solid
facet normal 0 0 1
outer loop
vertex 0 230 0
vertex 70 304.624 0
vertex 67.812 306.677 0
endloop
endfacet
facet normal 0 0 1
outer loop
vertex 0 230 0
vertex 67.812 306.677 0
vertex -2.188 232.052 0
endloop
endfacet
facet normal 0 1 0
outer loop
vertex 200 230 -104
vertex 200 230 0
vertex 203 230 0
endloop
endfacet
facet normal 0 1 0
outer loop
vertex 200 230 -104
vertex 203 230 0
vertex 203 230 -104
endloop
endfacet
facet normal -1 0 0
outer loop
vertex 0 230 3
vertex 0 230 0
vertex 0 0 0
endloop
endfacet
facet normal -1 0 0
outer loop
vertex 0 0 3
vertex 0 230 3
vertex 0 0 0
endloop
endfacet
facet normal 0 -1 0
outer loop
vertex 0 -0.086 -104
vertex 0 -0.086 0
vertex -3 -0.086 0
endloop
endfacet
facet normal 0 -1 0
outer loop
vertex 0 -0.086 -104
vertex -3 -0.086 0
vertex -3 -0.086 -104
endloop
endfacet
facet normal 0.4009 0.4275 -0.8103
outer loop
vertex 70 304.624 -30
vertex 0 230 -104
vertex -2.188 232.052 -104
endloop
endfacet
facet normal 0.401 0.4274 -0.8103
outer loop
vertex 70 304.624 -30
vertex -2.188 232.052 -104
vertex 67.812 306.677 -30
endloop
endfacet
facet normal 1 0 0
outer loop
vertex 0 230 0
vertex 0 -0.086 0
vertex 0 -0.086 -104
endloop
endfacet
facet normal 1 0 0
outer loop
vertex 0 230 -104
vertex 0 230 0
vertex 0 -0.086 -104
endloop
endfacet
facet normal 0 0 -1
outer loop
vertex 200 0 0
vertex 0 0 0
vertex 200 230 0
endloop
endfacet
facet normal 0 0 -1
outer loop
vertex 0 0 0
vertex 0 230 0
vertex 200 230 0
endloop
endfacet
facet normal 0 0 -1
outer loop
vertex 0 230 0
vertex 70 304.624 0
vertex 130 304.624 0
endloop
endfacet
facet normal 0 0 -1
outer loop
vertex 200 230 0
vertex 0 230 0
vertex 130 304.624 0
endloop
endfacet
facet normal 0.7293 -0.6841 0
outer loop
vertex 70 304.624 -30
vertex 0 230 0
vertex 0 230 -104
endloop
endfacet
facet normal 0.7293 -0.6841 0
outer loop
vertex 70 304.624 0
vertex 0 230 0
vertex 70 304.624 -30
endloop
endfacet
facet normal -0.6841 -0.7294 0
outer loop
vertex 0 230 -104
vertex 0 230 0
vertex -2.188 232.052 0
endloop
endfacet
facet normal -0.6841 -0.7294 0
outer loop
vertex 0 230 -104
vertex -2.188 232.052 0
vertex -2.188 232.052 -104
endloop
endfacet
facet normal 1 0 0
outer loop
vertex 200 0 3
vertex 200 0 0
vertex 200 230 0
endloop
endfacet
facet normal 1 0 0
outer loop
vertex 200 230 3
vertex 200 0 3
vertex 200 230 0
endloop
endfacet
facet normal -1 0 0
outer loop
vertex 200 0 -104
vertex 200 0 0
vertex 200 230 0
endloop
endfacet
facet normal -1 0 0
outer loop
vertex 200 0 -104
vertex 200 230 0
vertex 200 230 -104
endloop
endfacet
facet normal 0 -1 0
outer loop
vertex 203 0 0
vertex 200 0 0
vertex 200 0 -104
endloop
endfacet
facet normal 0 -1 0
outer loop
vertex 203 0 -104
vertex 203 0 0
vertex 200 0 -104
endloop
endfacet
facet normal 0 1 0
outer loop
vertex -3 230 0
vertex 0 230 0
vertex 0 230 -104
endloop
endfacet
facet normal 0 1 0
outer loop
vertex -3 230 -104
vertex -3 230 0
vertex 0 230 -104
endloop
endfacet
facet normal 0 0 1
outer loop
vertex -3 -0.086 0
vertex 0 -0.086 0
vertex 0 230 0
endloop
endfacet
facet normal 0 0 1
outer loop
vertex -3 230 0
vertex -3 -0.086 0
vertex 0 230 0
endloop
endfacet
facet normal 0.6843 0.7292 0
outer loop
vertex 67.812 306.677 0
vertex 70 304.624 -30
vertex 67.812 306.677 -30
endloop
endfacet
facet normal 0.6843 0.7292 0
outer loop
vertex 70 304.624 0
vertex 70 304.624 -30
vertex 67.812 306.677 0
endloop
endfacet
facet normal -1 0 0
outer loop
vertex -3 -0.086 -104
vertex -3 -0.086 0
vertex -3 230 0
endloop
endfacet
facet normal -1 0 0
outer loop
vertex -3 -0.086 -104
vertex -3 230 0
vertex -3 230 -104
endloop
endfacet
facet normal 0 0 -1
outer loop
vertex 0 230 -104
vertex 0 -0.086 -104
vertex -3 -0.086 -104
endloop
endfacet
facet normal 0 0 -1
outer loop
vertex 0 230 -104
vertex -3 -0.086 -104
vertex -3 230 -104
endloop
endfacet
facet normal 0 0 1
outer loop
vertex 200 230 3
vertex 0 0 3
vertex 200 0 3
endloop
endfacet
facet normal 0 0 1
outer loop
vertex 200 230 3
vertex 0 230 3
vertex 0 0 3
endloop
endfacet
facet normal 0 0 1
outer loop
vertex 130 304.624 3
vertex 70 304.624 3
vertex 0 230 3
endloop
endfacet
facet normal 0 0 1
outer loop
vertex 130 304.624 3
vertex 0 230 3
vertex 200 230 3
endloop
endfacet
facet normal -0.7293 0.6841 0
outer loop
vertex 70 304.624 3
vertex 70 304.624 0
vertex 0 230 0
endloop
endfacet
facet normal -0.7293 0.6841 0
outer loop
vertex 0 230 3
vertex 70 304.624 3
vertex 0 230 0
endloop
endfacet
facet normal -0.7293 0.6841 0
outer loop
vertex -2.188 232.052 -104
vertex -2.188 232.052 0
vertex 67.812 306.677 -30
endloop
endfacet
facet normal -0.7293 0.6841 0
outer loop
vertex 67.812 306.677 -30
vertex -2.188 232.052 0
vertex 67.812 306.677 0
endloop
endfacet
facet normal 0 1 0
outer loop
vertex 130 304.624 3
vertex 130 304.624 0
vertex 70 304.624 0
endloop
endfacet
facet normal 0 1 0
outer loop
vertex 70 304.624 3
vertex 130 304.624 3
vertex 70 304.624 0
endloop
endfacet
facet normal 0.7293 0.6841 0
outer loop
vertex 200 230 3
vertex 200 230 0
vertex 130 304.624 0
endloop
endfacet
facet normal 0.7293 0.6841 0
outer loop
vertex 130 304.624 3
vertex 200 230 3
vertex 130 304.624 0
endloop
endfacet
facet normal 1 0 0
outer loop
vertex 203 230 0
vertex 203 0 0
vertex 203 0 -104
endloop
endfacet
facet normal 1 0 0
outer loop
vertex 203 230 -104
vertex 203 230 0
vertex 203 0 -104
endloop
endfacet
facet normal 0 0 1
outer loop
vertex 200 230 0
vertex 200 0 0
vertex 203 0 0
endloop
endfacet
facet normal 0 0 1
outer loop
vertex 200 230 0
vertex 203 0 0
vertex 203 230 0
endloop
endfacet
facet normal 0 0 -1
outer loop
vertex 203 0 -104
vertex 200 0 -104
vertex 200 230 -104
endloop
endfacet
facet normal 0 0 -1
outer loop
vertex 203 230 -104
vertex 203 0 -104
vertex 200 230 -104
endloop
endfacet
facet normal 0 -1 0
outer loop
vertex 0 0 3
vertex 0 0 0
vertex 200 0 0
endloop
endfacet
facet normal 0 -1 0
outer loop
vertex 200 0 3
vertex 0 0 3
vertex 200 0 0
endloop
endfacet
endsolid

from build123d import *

# Parameters (mm, degrees)
BOSS_EXTRU_1_DEPTH = 3
BOSS_EXTRU_2_DEPTH = 3
ESQUISSE13_W       = 104
ESQUISSE13_H       = 230
BOSS_EXTRU_3_DEPTH = 3
ESQUISSE12_W       = 104
ESQUISSE12_H       = 230.086402331
BOSS_EXTRU_4_DEPTH = 3


with BuildPart() as part:
    # Esquisse1 → Boss.-Extru.1 (new body)
    with BuildSketch(Plane.XY):
        Polygon((0, 0), (200, 0), (200, 230), (130, 304.624260642), (70, 304.624260642), (0, 230), align=None)
    extrude(amount=BOSS_EXTRU_1_DEPTH)


with BuildPart() as body_2:
    # Esquisse10 → Boss.-Extru.2 (new body)
    with BuildSketch(Plane(origin=(-114.765098189, 107.653420002, 0), x_dir=(-0.6841478990944246, -0.7293433019948049, 0), z_dir=(-0.7293433019948049, 0.6841478990944246, 0))):
        Polygon((-167.748959459, 0), (-167.748959459, -104), (-270.066017061, -30), (-270.066017061, 0), align=None)
    extrude(amount=BOSS_EXTRU_2_DEPTH)


with BuildPart() as body_3:
    # Esquisse13 → Boss.-Extru.3 (new body)
    with BuildSketch(Plane(origin=(200, 0, 0), x_dir=(0, 0, -1), z_dir=(1, 0, 0))):
        with Locations((52, 115)):
            Rectangle(ESQUISSE13_W, ESQUISSE13_H)
    extrude(amount=BOSS_EXTRU_3_DEPTH)


with BuildPart() as body_4:
    # Esquisse12 → Boss.-Extru.4 (new body)
    with BuildSketch(Plane(origin=(0, 0, 0), x_dir=(0, 0, -1), z_dir=(1, 0, 0))):
        with Locations((52, 114.956798835)):
            Rectangle(ESQUISSE12_W, ESQUISSE12_H)
    extrude(amount=-BOSS_EXTRU_4_DEPTH)


solid = Compound([part.part, body_2.part, body_3.part, body_4.part])
